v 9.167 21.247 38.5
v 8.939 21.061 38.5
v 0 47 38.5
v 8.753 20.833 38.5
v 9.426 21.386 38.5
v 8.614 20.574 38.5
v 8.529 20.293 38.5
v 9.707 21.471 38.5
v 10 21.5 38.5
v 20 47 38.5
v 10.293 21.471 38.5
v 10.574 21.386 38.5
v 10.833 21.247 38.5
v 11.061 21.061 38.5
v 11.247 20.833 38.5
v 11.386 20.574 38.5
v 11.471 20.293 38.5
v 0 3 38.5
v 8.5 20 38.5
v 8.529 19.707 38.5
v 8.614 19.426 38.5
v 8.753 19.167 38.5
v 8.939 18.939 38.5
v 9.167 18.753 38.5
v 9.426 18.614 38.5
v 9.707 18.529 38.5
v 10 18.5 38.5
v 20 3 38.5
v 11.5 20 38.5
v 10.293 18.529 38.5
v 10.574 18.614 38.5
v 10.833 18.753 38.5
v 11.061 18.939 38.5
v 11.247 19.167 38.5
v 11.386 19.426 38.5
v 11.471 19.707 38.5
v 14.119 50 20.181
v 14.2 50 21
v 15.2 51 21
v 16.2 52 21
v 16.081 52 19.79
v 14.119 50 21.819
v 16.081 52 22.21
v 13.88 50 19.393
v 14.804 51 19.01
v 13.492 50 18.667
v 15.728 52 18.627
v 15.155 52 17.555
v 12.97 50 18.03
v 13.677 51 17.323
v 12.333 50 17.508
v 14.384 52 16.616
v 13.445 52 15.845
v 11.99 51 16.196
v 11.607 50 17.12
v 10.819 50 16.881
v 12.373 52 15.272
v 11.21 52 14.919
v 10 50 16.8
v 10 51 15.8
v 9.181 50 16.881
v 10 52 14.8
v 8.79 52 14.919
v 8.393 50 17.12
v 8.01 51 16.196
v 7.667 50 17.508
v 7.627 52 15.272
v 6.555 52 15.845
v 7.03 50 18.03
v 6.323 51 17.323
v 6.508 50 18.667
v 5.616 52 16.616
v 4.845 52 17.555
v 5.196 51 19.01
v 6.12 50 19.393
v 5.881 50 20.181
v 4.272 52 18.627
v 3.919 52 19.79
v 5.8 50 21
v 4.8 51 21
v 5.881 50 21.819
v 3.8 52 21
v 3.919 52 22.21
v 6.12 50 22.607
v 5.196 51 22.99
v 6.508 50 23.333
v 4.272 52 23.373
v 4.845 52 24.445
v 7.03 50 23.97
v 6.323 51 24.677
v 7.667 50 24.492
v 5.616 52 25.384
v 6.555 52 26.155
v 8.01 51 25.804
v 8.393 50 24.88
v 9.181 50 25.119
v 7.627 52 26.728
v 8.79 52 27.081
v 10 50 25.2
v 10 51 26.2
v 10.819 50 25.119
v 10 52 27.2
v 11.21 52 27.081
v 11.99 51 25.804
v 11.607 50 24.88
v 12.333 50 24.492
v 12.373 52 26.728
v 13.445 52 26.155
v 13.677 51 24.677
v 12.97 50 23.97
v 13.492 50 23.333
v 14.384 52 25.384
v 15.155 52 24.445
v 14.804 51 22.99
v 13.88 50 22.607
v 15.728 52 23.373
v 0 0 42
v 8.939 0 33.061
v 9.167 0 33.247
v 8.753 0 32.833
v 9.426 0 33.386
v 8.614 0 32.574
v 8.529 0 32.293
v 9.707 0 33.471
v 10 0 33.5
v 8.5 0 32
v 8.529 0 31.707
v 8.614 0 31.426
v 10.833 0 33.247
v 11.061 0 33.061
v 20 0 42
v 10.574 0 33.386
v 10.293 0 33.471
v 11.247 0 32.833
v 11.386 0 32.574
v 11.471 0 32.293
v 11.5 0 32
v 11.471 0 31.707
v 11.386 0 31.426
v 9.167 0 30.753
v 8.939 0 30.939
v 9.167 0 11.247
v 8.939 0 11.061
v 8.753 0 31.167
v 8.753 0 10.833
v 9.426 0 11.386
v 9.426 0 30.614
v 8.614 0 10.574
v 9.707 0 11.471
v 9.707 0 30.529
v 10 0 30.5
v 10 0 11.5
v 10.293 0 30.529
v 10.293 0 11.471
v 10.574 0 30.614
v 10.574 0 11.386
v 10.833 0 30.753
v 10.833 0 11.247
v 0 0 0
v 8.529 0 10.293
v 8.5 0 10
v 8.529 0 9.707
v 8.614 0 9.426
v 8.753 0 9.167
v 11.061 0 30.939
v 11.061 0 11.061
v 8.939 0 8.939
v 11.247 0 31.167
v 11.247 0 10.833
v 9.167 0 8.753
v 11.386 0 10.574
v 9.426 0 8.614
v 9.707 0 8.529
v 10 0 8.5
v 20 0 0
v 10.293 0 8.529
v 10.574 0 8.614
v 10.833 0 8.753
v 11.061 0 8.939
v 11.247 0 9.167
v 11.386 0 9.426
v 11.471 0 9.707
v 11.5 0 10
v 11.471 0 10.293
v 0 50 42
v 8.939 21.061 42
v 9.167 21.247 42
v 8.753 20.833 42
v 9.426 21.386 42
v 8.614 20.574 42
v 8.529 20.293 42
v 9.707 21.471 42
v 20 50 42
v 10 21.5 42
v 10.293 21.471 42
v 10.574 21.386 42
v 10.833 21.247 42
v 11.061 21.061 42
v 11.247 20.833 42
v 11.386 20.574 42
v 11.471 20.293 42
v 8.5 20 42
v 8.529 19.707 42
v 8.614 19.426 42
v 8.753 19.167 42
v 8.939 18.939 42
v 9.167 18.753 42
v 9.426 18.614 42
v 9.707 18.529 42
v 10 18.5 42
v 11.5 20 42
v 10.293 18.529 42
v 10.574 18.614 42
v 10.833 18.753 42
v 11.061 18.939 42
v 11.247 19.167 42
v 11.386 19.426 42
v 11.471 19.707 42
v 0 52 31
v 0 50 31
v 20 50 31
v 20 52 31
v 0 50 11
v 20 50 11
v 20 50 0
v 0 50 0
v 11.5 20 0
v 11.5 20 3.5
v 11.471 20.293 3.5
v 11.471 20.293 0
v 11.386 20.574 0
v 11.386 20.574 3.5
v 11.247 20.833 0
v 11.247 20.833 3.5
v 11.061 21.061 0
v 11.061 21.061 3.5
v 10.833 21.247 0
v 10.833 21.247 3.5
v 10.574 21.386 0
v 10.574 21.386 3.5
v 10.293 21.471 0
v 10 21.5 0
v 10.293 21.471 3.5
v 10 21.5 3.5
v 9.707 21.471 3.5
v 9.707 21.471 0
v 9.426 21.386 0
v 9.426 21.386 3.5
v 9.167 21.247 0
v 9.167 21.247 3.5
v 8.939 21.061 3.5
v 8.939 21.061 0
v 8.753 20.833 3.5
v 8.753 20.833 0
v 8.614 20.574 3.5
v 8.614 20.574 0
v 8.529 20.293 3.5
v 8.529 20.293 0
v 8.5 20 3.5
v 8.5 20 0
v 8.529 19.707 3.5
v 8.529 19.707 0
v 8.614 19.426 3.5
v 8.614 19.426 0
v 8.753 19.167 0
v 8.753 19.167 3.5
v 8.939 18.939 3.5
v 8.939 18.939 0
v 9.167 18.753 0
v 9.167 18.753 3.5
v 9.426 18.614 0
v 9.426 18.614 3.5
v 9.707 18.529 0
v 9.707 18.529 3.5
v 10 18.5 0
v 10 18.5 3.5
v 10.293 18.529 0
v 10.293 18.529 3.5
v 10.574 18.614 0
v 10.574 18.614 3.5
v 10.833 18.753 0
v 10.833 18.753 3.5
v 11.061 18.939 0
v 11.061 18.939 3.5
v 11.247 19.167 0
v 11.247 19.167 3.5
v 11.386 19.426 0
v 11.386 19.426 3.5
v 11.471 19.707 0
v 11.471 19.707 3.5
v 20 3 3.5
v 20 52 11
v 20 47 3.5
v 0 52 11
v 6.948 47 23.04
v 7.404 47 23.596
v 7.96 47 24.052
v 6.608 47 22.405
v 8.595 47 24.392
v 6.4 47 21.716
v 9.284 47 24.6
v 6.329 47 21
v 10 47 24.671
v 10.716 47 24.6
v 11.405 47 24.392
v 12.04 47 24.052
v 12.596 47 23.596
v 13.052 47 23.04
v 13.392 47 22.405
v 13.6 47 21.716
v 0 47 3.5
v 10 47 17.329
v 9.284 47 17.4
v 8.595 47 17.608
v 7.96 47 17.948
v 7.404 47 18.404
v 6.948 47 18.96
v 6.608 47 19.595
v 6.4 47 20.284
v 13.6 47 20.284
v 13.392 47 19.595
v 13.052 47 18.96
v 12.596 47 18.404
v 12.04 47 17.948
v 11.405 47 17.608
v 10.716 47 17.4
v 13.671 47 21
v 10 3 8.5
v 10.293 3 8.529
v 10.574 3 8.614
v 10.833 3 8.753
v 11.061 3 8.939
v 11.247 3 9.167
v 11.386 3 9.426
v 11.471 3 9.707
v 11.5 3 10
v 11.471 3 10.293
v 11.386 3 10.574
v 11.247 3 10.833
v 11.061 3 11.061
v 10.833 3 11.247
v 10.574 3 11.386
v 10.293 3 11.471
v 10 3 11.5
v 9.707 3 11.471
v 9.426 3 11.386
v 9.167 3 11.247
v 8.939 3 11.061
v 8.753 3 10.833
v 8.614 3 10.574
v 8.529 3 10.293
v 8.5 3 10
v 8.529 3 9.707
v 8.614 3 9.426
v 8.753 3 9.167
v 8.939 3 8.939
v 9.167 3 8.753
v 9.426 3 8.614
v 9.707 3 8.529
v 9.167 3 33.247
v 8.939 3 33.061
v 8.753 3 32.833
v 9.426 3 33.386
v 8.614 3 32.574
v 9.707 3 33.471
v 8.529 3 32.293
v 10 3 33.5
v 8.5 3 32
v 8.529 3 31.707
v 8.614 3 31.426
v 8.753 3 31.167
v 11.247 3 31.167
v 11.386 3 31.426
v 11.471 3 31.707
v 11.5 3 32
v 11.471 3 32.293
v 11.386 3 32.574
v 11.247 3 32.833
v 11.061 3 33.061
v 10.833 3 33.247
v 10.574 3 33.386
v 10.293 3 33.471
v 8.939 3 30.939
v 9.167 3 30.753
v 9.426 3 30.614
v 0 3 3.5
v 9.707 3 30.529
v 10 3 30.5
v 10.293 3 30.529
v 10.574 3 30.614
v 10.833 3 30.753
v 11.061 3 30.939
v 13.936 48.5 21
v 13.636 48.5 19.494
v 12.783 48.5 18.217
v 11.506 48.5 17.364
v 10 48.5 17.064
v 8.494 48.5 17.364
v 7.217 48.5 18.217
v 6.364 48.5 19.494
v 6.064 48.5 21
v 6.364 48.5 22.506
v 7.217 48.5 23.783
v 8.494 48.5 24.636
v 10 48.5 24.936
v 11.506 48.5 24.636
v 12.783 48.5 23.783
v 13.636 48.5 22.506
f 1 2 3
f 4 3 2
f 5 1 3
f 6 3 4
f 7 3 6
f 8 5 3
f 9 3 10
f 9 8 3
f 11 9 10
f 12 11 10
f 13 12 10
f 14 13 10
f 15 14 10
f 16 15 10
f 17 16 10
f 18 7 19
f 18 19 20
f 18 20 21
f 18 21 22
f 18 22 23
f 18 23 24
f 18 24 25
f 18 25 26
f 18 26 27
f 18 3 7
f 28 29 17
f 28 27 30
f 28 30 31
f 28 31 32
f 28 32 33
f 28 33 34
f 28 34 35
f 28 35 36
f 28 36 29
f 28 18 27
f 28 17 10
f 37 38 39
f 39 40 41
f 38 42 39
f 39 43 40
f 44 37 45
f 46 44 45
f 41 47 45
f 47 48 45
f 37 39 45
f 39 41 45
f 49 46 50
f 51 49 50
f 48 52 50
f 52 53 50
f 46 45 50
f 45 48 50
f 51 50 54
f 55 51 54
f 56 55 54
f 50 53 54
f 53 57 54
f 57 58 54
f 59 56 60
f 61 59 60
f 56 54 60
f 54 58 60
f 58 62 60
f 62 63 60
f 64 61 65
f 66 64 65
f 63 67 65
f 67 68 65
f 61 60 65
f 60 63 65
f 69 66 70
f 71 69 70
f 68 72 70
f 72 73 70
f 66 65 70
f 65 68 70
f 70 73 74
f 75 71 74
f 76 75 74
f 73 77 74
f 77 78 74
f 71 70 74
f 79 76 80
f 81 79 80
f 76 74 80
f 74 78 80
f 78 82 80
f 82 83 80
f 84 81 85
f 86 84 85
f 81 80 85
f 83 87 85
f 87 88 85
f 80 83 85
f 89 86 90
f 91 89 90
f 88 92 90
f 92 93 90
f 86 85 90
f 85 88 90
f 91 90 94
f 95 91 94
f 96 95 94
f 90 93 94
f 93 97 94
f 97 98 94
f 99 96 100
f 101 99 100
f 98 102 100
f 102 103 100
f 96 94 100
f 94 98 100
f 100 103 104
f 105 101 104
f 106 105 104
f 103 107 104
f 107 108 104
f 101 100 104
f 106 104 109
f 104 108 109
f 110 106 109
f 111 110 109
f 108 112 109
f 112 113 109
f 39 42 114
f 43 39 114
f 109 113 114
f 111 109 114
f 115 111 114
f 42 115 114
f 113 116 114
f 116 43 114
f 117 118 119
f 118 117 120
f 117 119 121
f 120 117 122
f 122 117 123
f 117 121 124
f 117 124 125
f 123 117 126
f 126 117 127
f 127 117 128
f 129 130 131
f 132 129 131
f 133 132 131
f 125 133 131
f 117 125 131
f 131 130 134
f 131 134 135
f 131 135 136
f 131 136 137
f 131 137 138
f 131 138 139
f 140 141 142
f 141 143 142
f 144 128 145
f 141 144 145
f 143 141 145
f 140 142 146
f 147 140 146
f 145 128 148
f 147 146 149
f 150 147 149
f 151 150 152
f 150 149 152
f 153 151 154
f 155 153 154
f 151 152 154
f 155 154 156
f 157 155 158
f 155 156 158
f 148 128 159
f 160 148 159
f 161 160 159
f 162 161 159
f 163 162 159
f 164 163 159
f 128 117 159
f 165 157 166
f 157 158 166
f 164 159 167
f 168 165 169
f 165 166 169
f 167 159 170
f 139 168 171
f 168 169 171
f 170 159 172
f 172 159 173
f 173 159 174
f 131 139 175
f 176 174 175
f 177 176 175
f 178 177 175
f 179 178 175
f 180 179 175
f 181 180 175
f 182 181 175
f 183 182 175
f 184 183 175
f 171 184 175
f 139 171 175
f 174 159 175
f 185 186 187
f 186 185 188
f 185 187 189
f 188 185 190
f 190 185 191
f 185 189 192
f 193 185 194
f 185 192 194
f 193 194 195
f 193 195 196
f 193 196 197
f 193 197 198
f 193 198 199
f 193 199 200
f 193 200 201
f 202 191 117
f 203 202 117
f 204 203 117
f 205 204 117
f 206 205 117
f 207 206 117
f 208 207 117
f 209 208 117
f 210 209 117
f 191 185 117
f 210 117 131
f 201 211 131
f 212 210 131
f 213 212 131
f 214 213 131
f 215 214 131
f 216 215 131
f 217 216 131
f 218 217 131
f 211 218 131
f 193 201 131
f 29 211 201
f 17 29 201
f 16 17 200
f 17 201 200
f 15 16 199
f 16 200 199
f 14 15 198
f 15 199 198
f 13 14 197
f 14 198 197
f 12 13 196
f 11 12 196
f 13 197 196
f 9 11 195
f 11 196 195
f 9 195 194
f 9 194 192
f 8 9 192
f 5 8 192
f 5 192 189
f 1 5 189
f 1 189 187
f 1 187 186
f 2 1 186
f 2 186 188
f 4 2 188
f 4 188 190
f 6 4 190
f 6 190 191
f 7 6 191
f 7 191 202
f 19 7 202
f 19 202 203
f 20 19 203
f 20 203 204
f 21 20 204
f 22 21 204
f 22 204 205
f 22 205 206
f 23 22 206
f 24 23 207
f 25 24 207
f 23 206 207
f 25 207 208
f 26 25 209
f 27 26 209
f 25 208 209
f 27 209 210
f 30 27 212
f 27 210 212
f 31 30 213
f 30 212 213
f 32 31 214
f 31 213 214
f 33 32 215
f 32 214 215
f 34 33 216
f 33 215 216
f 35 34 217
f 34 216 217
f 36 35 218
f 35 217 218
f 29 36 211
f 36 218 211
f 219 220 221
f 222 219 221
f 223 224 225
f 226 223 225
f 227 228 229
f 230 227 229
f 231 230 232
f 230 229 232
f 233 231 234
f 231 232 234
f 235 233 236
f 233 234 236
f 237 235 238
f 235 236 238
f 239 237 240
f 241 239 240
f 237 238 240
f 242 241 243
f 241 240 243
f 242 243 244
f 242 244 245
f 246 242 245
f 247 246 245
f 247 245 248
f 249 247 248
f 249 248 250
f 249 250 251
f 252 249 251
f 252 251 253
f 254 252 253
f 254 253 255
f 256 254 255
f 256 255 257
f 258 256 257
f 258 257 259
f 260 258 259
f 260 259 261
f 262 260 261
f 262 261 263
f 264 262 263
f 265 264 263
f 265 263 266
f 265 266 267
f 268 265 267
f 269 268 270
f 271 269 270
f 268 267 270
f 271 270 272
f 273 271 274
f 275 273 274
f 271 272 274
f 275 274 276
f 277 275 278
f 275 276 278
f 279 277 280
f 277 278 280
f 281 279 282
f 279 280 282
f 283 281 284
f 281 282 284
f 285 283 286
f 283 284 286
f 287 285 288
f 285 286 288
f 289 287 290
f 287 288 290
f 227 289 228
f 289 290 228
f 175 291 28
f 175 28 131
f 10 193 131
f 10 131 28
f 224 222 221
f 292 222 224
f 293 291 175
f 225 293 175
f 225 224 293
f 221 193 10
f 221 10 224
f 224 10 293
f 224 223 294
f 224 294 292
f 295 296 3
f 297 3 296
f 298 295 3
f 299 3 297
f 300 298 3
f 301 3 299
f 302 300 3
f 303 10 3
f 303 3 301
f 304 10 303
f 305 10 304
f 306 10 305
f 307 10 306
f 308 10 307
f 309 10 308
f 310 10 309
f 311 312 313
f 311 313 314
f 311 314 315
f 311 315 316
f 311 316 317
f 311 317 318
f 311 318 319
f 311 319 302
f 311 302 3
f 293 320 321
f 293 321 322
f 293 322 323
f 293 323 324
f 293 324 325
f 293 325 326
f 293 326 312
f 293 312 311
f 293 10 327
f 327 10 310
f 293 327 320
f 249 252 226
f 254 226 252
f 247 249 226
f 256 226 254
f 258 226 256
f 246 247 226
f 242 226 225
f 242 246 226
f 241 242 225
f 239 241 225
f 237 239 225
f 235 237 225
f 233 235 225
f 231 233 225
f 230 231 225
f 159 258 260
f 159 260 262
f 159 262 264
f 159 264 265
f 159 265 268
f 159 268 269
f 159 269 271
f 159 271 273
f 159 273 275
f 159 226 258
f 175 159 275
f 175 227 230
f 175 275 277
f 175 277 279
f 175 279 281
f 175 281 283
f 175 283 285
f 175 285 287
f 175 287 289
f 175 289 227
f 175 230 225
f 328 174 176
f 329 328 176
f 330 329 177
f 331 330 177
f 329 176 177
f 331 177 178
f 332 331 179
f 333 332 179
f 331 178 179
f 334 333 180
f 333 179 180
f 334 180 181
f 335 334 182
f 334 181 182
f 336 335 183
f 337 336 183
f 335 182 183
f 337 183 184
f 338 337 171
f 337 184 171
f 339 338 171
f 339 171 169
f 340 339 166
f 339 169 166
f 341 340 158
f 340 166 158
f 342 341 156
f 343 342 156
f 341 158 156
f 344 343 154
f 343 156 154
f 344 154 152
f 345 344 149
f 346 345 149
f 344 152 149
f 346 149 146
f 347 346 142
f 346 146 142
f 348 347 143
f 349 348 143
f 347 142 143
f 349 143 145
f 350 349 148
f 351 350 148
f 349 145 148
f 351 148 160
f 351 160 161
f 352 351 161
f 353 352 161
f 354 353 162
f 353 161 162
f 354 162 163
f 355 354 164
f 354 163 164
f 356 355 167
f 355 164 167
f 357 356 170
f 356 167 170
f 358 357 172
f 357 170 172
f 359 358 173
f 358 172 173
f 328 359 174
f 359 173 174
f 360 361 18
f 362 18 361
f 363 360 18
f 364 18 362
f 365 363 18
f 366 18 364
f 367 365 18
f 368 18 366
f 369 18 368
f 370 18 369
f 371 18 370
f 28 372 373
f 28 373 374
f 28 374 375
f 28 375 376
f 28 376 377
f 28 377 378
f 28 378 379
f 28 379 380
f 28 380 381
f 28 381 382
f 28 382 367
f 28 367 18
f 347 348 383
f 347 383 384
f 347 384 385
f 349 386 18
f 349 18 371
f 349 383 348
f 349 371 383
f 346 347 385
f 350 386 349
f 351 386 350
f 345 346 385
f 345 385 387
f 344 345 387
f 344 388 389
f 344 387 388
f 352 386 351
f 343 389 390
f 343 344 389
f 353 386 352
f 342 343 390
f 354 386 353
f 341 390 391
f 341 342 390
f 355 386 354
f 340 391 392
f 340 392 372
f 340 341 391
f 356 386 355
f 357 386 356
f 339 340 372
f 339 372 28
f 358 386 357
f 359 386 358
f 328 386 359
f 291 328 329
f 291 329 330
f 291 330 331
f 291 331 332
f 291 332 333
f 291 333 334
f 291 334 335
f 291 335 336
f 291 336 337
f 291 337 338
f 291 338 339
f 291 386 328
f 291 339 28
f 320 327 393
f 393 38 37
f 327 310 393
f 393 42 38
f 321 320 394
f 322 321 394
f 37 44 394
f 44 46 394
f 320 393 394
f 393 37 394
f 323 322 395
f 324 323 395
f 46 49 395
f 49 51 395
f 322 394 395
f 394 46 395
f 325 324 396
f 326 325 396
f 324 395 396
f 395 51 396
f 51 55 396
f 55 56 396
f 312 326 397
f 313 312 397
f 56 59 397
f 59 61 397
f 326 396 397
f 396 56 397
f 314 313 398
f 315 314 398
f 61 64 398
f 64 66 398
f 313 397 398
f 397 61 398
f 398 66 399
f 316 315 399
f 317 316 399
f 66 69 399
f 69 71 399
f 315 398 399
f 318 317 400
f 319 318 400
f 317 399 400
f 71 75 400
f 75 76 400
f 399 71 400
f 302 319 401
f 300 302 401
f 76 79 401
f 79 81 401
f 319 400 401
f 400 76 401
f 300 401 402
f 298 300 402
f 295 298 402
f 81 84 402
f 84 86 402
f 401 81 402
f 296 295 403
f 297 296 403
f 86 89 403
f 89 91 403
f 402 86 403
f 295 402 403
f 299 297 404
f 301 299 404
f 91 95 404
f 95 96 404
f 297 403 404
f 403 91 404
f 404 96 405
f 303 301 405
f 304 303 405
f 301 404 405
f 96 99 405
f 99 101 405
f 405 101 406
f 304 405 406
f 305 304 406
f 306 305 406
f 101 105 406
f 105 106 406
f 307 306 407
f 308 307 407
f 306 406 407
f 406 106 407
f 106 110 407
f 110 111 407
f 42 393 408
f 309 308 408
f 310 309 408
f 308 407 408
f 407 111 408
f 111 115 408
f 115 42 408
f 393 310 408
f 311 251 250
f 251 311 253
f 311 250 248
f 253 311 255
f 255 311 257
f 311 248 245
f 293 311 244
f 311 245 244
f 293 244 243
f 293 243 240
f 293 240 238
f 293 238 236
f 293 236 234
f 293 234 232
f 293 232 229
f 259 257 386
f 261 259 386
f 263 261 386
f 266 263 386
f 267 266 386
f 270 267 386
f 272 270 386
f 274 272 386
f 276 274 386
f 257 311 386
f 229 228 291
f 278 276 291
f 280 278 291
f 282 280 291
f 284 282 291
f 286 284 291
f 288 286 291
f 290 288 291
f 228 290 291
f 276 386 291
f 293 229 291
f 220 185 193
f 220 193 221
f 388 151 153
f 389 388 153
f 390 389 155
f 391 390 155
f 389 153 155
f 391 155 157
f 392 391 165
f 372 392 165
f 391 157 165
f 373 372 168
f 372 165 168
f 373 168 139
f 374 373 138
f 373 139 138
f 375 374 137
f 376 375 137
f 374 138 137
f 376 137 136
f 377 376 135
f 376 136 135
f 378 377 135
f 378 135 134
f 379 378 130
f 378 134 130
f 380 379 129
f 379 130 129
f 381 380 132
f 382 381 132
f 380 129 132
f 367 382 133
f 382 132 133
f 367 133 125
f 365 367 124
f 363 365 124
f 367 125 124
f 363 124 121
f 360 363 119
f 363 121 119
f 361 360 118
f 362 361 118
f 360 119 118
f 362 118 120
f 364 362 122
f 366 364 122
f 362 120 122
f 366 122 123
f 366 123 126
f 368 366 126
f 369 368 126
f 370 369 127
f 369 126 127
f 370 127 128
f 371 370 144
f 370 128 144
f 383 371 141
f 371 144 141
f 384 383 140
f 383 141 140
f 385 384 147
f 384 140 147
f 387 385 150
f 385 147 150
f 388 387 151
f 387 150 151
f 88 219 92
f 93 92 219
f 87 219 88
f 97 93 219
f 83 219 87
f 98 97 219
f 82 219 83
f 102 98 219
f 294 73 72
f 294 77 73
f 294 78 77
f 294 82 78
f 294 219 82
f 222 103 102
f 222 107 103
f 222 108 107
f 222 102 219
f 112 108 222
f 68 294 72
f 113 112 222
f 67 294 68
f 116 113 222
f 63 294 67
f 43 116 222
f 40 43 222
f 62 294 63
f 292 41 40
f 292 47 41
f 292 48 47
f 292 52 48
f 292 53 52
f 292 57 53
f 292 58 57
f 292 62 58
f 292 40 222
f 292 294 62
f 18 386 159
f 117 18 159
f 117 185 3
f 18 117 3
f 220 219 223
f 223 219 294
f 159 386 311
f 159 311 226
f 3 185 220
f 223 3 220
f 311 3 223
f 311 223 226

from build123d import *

# Parameters (mm, degrees)
SKETCH_1_W          = 20
SKETCH_1_H          = 42
EXTRUDE_1_DEPTH     = 3
SKETCH_2_W          = 20
SKETCH_2_H          = 3.5
EXTRUDE_2_DEPTH     = 47
SKETCH_3_R          = 1.5
CUT_EXTRUDE_1_DEPTH = 69.293484316
SKETCH_4_W          = 35
SKETCH_4_H          = 3
EXTRUDE_3_DEPTH     = 20
SKETCH_8_W          = 20
SKETCH_8_H          = 20
EXTRUDE_5_DEPTH     = 2
SKETCH_9_R          = 6.2
CUT_EXTRUDE_4_DEPTH = 2
CUT_EXTRUDE_4_DRAFT = -45
SKETCH_10_R         = 4.2
CUT_EXTRUDE_5_DEPTH = 3
CUT_EXTRUDE_5_DRAFT = -10
SKETCH_11_R         = 1.5
CUT_EXTRUDE_6_DEPTH = 3


with BuildPart() as part:
    # 草图1 → 凸台-拉伸1 (new body)
    with BuildSketch(Plane(origin=(0, 0, 0), x_dir=(1, 0, 0), z_dir=(0, 1, 0))):
        with Locations((10, -21)):
            Rectangle(SKETCH_1_W, SKETCH_1_H)
    extrude(amount=EXTRUDE_1_DEPTH)

    # 草图2 → 凸台-拉伸2 (add)
    with BuildSketch(Plane(origin=(0, 3, 0), x_dir=(1, 0, 0), z_dir=(0, 1, 0))):
        with Locations((10, -40.25)):
            Rectangle(SKETCH_2_W, SKETCH_2_H)
        with Locations((10, -1.75)):
            Rectangle(SKETCH_2_W, SKETCH_2_H)
    extrude(amount=EXTRUDE_2_DEPTH)

    # 草图3 → 切除-拉伸1 (cut, through all)
    with BuildSketch(Plane.XY.offset(42)):
        with Locations((10, 20)):
            Circle(SKETCH_3_R)
    extrude(amount=-CUT_EXTRUDE_1_DEPTH, mode=Mode.SUBTRACT)

    # 草图4 → 凸台-拉伸3 (add)
    with BuildSketch(Plane(origin=(20, 0, 0), x_dir=(0, 0, -1), z_dir=(1, 0, 0))):
        with Locations((-21, 48.5)):
            Rectangle(SKETCH_4_W, SKETCH_4_H)
    extrude(amount=-EXTRUDE_3_DEPTH)

    # 草图8 → 凸台-拉伸5 (add)
    with BuildSketch(Plane(origin=(0, 50, 0), x_dir=(1, 0, 0), z_dir=(0, 1, 0))):
        with Locations((10, -21)):
            Rectangle(SKETCH_8_W, SKETCH_8_H)
    extrude(amount=EXTRUDE_5_DEPTH)


with BuildPart() as cut_extrude_4_tool:
    # 草图9 → 切除-拉伸4 (with draft: the straight prism first)
    with BuildSketch(Plane(origin=(0, 52, 0), x_dir=(1, 0, 0), z_dir=(0, 1, 0))):
        with Locations((10, -21)):
            Circle(SKETCH_9_R)
    extrude(amount=-CUT_EXTRUDE_4_DEPTH)
    # 切除-拉伸4: the draft: its side faces are tilted about the plane it starts from
    cut_extrude_4_sides = [cut_extrude_4_tool.faces().sort_by_distance(p)[0] for p in [
        (3.8, 51, 21),
    ]]
    draft(cut_extrude_4_sides, Plane(origin=(0, 52, 0), x_dir=(1, 0, 0), z_dir=(0, 1, 0)), CUT_EXTRUDE_4_DRAFT)


with BuildPart() as part_1:
    add(part.part)

    # 切除-拉伸4: cut by cut_extrude_4_tool
    add(cut_extrude_4_tool.part, mode=Mode.SUBTRACT)


with BuildPart() as cut_extrude_5_tool:
    # 草图10 → 切除-拉伸5 (with draft: the straight prism first)
    with BuildSketch(Plane(origin=(0, 50, 0), x_dir=(1, 0, 0), z_dir=(0, 1, 0))):
        with Locations((10, -21)):
            Circle(SKETCH_10_R)
    extrude(amount=-CUT_EXTRUDE_5_DEPTH)
    # 切除-拉伸5: the draft: its side faces are tilted about the plane it starts from
    cut_extrude_5_sides = [cut_extrude_5_tool.faces().sort_by_distance(p)[0] for p in [
        (5.8, 48.5, 21),
    ]]
    draft(cut_extrude_5_sides, Plane(origin=(0, 50, 0), x_dir=(1, 0, 0), z_dir=(0, 1, 0)), CUT_EXTRUDE_5_DRAFT)


with BuildPart() as part_2:
    add(part_1.part)

    # 切除-拉伸5: cut by cut_extrude_5_tool
    add(cut_extrude_5_tool.part, mode=Mode.SUBTRACT)

    # 草图11 → 切除-拉伸6 (cut)
    with BuildSketch(Plane(origin=(0, 0, 0), x_dir=(-1, 0, 0), z_dir=(0, -1, 0))):
        with Locations(Location((-10, -32, 0), (0, 0, 90))):
            Circle(SKETCH_11_R)
        with Locations(Location((-10, -10, 0), (0, 0, 90))):
            Circle(SKETCH_11_R)
    extrude(amount=-CUT_EXTRUDE_6_DEPTH, mode=Mode.SUBTRACT)


solid = part_2.part
